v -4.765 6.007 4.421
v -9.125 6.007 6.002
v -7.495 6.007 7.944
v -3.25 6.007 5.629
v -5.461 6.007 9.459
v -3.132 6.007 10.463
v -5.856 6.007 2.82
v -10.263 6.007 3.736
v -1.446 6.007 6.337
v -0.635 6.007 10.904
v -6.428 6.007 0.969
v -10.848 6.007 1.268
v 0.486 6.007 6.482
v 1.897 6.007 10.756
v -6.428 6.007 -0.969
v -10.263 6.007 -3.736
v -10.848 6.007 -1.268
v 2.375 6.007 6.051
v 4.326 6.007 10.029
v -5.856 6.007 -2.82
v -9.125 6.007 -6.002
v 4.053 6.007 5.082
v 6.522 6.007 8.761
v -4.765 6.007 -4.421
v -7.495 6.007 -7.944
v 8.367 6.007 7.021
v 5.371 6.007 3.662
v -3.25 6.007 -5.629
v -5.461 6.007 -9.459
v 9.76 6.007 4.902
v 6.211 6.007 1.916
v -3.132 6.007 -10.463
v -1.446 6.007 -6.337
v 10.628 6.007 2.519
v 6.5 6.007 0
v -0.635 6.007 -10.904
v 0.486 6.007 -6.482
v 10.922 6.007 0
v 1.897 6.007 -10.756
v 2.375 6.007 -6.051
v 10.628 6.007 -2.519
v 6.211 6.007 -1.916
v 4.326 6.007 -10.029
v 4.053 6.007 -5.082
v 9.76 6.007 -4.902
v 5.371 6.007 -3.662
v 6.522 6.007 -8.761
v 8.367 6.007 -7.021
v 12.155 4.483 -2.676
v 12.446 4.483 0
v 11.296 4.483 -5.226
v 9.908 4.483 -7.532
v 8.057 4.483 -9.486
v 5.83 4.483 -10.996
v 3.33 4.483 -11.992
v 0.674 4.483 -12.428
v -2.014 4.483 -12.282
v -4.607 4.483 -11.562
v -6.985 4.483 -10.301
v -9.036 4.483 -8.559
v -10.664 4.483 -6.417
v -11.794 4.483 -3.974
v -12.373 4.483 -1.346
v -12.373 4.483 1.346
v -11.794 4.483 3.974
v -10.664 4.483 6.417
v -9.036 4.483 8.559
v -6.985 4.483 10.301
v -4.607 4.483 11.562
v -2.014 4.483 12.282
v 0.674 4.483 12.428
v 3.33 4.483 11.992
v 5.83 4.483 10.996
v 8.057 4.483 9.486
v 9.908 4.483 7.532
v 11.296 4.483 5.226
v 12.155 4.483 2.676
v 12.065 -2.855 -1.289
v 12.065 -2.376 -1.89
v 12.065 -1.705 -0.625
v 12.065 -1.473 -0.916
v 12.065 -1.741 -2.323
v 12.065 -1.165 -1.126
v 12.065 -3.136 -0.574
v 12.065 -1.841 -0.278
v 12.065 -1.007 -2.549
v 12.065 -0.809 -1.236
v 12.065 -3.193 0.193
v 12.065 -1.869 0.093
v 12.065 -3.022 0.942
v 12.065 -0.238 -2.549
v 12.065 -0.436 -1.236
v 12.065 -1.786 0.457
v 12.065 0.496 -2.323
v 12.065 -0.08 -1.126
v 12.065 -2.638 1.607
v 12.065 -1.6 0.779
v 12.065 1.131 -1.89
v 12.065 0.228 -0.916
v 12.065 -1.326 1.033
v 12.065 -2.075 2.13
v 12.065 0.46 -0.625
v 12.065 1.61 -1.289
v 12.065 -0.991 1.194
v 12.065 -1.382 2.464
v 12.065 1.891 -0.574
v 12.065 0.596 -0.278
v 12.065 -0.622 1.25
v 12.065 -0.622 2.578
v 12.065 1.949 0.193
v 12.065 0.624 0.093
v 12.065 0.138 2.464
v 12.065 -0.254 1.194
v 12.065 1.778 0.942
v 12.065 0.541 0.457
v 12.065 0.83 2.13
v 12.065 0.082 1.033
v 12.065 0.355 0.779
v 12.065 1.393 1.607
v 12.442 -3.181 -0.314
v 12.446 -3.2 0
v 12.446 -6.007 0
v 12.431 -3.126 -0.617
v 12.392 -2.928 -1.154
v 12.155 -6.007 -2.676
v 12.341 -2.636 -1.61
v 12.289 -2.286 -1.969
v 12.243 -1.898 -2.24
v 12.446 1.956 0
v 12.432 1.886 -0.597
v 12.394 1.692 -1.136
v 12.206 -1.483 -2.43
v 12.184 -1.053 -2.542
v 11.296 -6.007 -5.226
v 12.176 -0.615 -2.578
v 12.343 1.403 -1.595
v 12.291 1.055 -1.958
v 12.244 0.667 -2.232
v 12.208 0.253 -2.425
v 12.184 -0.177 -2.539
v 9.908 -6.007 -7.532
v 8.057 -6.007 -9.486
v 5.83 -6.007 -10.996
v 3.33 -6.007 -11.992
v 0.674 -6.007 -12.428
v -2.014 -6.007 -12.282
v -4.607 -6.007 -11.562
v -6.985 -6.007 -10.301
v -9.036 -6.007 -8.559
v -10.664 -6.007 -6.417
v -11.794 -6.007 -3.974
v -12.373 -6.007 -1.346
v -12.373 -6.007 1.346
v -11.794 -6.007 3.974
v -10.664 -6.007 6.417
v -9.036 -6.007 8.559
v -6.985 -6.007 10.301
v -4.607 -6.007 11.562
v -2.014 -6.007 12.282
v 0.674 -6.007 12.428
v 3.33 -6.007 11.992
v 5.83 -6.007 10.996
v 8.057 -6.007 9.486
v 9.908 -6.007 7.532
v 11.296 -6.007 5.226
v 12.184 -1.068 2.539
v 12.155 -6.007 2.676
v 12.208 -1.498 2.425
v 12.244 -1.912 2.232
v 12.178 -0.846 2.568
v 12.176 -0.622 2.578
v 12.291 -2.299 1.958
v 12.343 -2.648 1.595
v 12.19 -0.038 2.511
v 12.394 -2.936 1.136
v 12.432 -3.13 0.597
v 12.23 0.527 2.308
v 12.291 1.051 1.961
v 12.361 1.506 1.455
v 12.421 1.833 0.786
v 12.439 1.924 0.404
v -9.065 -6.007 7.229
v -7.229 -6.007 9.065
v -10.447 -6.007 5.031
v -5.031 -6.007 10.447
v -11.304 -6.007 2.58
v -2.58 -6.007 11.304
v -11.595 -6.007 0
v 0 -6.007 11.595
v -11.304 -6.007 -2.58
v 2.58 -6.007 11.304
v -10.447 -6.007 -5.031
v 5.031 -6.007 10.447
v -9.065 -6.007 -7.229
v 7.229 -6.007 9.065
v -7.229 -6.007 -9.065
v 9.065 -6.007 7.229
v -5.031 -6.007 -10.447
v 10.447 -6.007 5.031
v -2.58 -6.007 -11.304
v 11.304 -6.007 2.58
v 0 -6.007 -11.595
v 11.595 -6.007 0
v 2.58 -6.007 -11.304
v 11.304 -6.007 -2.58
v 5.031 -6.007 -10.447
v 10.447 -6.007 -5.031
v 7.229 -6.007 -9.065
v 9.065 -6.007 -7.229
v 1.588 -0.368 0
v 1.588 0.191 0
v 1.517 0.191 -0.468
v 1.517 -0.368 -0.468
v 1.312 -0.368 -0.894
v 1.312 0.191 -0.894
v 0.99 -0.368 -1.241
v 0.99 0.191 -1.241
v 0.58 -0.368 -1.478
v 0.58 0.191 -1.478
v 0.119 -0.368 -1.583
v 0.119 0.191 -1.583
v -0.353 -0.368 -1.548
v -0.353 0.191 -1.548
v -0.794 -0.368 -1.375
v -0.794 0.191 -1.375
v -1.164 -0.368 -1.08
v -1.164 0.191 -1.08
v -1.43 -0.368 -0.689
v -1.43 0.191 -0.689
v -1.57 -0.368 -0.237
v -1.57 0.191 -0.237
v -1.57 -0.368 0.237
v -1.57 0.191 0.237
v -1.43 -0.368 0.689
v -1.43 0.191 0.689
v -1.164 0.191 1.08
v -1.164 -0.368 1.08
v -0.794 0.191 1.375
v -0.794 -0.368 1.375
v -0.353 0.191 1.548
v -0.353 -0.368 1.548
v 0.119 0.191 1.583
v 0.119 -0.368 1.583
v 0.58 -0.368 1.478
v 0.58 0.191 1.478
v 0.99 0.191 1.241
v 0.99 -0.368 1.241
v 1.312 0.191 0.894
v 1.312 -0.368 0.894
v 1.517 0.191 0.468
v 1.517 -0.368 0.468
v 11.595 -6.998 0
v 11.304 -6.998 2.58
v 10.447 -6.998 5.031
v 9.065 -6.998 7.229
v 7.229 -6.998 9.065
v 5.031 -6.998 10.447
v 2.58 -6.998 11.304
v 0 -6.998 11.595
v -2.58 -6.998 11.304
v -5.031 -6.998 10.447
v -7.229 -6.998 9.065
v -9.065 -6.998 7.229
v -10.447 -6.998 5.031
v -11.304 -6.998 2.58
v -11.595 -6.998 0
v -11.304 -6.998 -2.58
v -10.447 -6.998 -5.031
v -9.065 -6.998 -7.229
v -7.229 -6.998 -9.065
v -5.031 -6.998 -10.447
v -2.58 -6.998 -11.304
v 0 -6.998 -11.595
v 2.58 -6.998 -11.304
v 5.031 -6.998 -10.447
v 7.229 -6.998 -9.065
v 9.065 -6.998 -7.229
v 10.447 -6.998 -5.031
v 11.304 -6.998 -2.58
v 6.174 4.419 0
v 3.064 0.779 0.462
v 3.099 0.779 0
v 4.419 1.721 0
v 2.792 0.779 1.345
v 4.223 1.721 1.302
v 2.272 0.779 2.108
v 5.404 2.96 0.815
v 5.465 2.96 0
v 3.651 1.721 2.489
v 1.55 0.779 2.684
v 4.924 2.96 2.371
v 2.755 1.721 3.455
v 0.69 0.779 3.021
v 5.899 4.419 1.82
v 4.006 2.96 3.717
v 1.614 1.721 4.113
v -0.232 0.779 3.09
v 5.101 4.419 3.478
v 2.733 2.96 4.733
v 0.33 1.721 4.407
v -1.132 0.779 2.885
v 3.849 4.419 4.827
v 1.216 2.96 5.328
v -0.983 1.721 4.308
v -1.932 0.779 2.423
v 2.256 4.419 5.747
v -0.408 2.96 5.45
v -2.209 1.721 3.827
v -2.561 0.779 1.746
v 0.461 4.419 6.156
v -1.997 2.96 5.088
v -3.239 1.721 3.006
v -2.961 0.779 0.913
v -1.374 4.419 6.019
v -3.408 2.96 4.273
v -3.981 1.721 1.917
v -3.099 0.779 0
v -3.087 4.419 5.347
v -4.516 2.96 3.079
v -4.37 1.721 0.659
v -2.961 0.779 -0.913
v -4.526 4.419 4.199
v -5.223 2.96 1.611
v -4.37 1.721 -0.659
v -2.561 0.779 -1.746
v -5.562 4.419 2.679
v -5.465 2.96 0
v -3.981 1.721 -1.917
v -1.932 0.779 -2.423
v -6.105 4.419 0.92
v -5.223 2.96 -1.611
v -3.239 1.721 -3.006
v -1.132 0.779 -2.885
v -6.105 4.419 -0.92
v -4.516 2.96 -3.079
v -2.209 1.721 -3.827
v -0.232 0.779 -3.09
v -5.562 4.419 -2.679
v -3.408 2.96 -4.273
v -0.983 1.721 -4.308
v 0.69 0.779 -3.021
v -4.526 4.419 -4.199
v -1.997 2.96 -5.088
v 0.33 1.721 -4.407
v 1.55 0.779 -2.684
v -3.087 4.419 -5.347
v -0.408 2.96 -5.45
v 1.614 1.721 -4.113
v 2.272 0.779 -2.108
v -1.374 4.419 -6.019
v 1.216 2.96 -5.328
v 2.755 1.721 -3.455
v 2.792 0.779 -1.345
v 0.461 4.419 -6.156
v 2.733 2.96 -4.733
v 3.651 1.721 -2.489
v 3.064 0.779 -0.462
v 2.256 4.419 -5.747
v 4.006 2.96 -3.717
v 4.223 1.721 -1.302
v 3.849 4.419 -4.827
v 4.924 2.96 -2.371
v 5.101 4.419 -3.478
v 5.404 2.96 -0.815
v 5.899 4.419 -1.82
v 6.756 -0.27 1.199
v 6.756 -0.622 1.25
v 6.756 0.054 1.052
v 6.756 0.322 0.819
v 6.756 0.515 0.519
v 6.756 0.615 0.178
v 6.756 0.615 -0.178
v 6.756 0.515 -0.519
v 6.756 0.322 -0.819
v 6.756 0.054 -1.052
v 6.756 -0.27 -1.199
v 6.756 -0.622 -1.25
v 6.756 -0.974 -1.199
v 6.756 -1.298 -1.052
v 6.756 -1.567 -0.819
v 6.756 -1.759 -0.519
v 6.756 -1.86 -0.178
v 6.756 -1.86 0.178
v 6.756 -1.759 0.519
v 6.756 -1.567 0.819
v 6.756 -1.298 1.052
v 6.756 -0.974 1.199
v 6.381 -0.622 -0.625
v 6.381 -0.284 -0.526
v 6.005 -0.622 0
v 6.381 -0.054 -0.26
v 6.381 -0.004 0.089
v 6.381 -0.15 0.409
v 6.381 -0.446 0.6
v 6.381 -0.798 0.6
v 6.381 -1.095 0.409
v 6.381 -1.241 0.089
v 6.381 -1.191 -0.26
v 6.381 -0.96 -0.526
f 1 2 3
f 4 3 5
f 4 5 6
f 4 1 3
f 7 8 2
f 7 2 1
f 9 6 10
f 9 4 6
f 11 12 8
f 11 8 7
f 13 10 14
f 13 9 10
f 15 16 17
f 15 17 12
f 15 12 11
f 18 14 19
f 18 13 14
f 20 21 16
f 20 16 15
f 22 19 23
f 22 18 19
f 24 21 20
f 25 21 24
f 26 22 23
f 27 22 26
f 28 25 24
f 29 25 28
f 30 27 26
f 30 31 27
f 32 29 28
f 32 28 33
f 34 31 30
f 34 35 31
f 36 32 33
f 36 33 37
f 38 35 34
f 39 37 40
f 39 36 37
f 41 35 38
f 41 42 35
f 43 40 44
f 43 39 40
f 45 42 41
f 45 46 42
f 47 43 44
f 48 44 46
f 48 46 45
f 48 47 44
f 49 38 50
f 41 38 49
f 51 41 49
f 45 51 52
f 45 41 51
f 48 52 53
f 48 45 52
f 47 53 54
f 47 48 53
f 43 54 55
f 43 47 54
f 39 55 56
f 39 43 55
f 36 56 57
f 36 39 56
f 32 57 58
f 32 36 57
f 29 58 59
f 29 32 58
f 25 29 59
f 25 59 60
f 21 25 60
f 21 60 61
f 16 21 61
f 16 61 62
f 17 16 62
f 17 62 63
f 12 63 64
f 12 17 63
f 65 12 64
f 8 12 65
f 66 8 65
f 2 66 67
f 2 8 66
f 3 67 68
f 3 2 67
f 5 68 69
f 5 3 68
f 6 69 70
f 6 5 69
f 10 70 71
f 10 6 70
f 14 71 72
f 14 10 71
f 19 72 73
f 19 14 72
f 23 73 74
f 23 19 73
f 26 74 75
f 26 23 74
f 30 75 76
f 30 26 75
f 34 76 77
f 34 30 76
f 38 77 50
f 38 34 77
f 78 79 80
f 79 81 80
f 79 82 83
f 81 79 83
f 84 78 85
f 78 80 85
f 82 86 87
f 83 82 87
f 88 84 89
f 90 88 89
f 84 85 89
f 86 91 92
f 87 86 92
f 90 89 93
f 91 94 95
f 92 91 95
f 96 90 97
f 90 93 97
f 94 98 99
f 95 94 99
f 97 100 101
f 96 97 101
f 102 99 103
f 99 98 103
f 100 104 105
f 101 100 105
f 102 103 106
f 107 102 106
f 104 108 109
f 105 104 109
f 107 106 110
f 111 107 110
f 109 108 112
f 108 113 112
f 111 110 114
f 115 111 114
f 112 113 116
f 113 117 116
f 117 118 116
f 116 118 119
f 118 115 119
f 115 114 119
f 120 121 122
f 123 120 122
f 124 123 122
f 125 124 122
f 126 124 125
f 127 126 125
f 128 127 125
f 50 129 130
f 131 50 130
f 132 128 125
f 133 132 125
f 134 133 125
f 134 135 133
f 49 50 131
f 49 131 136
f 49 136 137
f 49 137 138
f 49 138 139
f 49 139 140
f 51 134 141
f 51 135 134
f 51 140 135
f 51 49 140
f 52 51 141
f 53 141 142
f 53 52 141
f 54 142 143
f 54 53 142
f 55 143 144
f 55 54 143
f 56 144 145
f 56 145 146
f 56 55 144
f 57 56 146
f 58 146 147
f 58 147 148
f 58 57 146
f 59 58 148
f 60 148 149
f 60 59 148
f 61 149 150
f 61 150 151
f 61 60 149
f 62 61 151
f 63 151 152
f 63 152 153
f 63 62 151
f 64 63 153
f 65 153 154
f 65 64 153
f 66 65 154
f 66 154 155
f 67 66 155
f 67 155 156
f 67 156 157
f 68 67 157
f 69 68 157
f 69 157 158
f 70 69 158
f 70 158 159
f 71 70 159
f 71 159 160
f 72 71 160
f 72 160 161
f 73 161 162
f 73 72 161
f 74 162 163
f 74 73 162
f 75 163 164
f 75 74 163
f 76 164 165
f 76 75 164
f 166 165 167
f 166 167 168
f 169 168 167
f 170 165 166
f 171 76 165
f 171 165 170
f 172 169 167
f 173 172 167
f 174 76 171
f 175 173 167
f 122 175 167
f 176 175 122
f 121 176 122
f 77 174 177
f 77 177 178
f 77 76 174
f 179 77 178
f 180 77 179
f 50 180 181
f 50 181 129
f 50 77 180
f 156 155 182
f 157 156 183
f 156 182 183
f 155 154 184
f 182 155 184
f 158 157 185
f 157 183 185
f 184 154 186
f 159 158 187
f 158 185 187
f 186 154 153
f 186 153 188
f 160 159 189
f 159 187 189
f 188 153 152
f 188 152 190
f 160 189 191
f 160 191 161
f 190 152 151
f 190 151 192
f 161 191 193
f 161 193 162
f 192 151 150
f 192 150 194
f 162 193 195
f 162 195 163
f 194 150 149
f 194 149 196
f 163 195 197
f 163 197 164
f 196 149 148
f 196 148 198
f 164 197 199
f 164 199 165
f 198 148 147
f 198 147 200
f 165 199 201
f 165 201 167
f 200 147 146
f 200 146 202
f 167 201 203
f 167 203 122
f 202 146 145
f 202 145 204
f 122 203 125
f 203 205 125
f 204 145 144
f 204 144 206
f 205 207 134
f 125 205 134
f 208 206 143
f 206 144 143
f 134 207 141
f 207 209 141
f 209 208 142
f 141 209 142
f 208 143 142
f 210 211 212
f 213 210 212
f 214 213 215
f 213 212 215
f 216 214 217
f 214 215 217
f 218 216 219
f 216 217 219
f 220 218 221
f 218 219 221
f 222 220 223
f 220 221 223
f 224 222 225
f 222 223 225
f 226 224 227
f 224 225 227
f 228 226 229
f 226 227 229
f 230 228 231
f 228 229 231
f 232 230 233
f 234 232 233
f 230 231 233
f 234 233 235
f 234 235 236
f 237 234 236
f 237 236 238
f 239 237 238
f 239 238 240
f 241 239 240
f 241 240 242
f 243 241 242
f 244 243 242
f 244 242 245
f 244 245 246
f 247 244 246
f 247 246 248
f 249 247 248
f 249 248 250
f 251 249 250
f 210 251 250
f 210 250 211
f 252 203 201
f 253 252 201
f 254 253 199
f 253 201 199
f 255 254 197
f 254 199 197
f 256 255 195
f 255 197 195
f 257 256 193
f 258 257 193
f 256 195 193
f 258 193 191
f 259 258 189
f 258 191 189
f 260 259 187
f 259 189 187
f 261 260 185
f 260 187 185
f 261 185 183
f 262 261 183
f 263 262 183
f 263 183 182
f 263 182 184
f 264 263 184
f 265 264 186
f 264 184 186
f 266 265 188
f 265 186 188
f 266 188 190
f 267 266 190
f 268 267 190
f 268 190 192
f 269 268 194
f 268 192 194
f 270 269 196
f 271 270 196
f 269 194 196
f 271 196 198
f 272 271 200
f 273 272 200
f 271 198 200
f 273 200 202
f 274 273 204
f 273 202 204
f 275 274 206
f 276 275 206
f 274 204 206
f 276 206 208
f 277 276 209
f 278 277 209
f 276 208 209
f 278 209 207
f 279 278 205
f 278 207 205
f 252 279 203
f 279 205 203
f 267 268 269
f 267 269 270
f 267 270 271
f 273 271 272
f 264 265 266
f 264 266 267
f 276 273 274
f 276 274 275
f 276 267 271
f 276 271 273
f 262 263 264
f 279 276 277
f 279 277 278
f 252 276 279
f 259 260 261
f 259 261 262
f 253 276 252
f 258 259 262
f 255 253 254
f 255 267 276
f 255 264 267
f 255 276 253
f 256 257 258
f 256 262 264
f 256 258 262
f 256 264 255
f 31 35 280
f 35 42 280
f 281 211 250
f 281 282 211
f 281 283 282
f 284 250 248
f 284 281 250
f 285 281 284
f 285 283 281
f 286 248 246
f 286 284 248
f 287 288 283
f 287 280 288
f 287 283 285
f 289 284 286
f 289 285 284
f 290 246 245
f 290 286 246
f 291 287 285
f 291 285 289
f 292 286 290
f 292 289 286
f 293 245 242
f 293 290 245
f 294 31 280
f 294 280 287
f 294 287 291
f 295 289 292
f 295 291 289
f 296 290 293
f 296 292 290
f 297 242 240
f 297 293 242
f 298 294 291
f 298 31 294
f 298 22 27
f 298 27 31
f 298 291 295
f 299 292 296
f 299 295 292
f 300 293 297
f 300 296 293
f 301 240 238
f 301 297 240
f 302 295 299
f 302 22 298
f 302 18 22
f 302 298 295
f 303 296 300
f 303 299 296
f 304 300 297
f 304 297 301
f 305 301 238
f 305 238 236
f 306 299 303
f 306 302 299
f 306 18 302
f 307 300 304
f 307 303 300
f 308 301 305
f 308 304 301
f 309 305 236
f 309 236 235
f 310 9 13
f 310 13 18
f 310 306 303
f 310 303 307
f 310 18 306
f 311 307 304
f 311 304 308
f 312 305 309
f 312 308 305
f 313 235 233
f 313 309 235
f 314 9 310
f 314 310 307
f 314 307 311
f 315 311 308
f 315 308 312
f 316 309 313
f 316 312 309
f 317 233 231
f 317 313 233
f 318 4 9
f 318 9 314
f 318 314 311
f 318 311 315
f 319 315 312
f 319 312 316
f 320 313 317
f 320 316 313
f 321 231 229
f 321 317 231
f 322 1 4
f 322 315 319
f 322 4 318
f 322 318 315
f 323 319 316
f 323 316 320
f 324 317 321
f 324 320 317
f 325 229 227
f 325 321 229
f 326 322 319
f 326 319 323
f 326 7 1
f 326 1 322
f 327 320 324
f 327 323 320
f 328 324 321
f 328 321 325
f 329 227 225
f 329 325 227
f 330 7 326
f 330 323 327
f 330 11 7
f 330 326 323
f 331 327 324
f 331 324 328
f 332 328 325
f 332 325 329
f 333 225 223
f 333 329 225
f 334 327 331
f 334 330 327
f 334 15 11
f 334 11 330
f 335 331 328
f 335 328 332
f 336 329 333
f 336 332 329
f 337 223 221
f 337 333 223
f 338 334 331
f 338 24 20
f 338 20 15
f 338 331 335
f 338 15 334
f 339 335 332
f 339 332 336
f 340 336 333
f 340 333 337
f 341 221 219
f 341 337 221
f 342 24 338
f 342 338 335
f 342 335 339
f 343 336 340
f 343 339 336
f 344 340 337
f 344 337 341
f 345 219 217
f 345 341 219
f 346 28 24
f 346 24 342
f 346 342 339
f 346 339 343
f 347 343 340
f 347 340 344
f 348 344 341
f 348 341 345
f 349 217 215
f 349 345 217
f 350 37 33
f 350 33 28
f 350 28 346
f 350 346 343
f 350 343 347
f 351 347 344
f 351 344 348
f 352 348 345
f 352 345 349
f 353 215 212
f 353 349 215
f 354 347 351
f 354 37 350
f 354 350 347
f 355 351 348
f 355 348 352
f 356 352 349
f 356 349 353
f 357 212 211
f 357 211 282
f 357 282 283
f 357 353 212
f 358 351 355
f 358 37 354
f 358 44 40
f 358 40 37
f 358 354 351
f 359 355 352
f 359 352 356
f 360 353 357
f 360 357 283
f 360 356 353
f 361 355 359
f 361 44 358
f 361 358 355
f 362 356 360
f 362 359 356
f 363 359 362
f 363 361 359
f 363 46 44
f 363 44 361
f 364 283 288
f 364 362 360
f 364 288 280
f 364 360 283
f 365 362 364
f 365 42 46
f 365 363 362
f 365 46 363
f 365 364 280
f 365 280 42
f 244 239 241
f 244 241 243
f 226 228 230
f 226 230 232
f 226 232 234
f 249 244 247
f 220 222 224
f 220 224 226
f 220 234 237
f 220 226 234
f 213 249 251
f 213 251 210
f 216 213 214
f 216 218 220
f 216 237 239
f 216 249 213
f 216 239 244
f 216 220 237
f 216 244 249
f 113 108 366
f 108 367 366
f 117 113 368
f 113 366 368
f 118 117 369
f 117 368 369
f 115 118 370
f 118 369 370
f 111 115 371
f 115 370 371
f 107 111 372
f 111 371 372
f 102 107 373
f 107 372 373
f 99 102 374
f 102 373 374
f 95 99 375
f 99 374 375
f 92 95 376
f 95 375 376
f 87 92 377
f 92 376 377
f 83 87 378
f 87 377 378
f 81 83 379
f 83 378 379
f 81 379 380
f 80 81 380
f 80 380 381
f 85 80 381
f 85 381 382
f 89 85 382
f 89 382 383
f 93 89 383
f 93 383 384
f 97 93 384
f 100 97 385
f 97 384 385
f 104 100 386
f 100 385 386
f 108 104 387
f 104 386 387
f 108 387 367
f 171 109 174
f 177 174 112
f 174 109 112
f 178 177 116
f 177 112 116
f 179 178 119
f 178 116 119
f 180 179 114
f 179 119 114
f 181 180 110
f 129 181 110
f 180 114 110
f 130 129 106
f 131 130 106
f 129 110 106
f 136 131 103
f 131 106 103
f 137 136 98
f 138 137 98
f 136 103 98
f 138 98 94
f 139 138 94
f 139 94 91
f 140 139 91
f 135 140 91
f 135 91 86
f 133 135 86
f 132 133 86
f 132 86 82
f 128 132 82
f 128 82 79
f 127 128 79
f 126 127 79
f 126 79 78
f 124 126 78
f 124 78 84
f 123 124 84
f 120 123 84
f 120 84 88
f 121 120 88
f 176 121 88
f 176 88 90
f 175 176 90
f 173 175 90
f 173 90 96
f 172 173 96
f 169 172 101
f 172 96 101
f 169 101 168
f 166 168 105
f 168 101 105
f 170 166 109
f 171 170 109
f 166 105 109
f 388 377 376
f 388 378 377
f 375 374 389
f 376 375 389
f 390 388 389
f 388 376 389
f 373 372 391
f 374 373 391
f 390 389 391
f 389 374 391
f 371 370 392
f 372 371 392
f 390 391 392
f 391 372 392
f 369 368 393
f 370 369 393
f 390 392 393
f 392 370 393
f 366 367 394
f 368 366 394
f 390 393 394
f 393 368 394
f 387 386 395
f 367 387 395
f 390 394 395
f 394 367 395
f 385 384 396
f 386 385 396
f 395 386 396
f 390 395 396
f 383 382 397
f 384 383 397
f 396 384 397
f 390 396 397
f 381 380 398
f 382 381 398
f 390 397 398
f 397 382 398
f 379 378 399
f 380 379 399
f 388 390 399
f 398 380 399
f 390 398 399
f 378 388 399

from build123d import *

# Parameters (mm, degrees)
SKETCH1_R                          = 12.446
EXTRUDE1_DEPTH                     = 6.0071
CHAMFER1_SIZE                      = 1.524
SKETCH2_R                          = 11.5951
EXTRUDE2_DEPTH                     = 0.99076
SKETCH3_R                          = 1.5875
EXTRUDE3_DEPTH                     = 6.3754
F_5_16_0_3125_DIAMETER_HOLE2_D     = 5.1562
F_5_16_0_3125_DIAMETER_HOLE2_DEPTH = 0.381
M3X0_5_TAPPED_HOLE1_D              = 2.5
M3X0_5_TAPPED_HOLE1_DEPTH          = 5.3086
M3X0_5_TAPPED_HOLE1_TIP            = 0.751075774


with BuildPart() as part:
    # Sketch1 → Extrude1 (new body, symmetric)
    with BuildSketch(Plane(origin=(0, 0, 0), x_dir=(1, 0, 0), z_dir=(0, 1, 0))):
        Circle(SKETCH1_R)
    extrude(amount=EXTRUDE1_DEPTH, both=True)

    # Chamfer1
    chamfer1_edges = [part.edges().sort_by_distance(p)[0] for p in [
        (-12.446, 6.0071, 0),
    ]]
    chamfer(chamfer1_edges, length=CHAMFER1_SIZE)

    # Sketch2 → Extrude2 (add)
    with BuildSketch(Plane.XZ.offset(6.0071)):
        Circle(SKETCH2_R)
    extrude(amount=EXTRUDE2_DEPTH)

    # Sketch3 → Extrude3 (cut)
    with BuildSketch(Plane(origin=(0, 6.0071, 0), x_dir=(1, 0, 0), z_dir=(0, 1, 0))):
        Circle(SKETCH3_R)
    extrude(amount=-EXTRUDE3_DEPTH, mode=Mode.SUBTRACT)

    # Sketch4 → Cut-Revolve1 (revolve, cut)
    with BuildSketch(Plane.XY):
        with BuildLine():
            Line((0, 13.035099954), (0, -0.004899954))
            ThreePointArc((0, -0.004899954), (6.519999954, 6.5151), (0, 13.035099954))
        make_face()
    revolve(axis=Axis((0, 13.035099954, 0), (0, -1, 0)), mode=Mode.SUBTRACT)

    # 5/16 (0.3125) Diameter Hole2
    with Locations(Plane(origin=(12.446, 0, 0), x_dir=(0, 0, -1), z_dir=(1, 0, 0))):
        with Locations((0, -0.6223)):
            Hole(F_5_16_0_3125_DIAMETER_HOLE2_D / 2, depth=F_5_16_0_3125_DIAMETER_HOLE2_DEPTH)

    # M3x0.5 Tapped Hole1
    with Locations(Plane(origin=(12.065, 0, 0), x_dir=(0, 0, -1), z_dir=(1, 0, 0))):
        with Locations((0, -0.6223)):
            Hole(M3X0_5_TAPPED_HOLE1_D / 2, depth=M3X0_5_TAPPED_HOLE1_DEPTH)
            with Locations((0, 0, -(M3X0_5_TAPPED_HOLE1_DEPTH + M3X0_5_TAPPED_HOLE1_TIP / 2))):  # 118° drill point
                Cone(0, M3X0_5_TAPPED_HOLE1_D / 2, M3X0_5_TAPPED_HOLE1_TIP, mode=Mode.SUBTRACT)


solid = part.part
